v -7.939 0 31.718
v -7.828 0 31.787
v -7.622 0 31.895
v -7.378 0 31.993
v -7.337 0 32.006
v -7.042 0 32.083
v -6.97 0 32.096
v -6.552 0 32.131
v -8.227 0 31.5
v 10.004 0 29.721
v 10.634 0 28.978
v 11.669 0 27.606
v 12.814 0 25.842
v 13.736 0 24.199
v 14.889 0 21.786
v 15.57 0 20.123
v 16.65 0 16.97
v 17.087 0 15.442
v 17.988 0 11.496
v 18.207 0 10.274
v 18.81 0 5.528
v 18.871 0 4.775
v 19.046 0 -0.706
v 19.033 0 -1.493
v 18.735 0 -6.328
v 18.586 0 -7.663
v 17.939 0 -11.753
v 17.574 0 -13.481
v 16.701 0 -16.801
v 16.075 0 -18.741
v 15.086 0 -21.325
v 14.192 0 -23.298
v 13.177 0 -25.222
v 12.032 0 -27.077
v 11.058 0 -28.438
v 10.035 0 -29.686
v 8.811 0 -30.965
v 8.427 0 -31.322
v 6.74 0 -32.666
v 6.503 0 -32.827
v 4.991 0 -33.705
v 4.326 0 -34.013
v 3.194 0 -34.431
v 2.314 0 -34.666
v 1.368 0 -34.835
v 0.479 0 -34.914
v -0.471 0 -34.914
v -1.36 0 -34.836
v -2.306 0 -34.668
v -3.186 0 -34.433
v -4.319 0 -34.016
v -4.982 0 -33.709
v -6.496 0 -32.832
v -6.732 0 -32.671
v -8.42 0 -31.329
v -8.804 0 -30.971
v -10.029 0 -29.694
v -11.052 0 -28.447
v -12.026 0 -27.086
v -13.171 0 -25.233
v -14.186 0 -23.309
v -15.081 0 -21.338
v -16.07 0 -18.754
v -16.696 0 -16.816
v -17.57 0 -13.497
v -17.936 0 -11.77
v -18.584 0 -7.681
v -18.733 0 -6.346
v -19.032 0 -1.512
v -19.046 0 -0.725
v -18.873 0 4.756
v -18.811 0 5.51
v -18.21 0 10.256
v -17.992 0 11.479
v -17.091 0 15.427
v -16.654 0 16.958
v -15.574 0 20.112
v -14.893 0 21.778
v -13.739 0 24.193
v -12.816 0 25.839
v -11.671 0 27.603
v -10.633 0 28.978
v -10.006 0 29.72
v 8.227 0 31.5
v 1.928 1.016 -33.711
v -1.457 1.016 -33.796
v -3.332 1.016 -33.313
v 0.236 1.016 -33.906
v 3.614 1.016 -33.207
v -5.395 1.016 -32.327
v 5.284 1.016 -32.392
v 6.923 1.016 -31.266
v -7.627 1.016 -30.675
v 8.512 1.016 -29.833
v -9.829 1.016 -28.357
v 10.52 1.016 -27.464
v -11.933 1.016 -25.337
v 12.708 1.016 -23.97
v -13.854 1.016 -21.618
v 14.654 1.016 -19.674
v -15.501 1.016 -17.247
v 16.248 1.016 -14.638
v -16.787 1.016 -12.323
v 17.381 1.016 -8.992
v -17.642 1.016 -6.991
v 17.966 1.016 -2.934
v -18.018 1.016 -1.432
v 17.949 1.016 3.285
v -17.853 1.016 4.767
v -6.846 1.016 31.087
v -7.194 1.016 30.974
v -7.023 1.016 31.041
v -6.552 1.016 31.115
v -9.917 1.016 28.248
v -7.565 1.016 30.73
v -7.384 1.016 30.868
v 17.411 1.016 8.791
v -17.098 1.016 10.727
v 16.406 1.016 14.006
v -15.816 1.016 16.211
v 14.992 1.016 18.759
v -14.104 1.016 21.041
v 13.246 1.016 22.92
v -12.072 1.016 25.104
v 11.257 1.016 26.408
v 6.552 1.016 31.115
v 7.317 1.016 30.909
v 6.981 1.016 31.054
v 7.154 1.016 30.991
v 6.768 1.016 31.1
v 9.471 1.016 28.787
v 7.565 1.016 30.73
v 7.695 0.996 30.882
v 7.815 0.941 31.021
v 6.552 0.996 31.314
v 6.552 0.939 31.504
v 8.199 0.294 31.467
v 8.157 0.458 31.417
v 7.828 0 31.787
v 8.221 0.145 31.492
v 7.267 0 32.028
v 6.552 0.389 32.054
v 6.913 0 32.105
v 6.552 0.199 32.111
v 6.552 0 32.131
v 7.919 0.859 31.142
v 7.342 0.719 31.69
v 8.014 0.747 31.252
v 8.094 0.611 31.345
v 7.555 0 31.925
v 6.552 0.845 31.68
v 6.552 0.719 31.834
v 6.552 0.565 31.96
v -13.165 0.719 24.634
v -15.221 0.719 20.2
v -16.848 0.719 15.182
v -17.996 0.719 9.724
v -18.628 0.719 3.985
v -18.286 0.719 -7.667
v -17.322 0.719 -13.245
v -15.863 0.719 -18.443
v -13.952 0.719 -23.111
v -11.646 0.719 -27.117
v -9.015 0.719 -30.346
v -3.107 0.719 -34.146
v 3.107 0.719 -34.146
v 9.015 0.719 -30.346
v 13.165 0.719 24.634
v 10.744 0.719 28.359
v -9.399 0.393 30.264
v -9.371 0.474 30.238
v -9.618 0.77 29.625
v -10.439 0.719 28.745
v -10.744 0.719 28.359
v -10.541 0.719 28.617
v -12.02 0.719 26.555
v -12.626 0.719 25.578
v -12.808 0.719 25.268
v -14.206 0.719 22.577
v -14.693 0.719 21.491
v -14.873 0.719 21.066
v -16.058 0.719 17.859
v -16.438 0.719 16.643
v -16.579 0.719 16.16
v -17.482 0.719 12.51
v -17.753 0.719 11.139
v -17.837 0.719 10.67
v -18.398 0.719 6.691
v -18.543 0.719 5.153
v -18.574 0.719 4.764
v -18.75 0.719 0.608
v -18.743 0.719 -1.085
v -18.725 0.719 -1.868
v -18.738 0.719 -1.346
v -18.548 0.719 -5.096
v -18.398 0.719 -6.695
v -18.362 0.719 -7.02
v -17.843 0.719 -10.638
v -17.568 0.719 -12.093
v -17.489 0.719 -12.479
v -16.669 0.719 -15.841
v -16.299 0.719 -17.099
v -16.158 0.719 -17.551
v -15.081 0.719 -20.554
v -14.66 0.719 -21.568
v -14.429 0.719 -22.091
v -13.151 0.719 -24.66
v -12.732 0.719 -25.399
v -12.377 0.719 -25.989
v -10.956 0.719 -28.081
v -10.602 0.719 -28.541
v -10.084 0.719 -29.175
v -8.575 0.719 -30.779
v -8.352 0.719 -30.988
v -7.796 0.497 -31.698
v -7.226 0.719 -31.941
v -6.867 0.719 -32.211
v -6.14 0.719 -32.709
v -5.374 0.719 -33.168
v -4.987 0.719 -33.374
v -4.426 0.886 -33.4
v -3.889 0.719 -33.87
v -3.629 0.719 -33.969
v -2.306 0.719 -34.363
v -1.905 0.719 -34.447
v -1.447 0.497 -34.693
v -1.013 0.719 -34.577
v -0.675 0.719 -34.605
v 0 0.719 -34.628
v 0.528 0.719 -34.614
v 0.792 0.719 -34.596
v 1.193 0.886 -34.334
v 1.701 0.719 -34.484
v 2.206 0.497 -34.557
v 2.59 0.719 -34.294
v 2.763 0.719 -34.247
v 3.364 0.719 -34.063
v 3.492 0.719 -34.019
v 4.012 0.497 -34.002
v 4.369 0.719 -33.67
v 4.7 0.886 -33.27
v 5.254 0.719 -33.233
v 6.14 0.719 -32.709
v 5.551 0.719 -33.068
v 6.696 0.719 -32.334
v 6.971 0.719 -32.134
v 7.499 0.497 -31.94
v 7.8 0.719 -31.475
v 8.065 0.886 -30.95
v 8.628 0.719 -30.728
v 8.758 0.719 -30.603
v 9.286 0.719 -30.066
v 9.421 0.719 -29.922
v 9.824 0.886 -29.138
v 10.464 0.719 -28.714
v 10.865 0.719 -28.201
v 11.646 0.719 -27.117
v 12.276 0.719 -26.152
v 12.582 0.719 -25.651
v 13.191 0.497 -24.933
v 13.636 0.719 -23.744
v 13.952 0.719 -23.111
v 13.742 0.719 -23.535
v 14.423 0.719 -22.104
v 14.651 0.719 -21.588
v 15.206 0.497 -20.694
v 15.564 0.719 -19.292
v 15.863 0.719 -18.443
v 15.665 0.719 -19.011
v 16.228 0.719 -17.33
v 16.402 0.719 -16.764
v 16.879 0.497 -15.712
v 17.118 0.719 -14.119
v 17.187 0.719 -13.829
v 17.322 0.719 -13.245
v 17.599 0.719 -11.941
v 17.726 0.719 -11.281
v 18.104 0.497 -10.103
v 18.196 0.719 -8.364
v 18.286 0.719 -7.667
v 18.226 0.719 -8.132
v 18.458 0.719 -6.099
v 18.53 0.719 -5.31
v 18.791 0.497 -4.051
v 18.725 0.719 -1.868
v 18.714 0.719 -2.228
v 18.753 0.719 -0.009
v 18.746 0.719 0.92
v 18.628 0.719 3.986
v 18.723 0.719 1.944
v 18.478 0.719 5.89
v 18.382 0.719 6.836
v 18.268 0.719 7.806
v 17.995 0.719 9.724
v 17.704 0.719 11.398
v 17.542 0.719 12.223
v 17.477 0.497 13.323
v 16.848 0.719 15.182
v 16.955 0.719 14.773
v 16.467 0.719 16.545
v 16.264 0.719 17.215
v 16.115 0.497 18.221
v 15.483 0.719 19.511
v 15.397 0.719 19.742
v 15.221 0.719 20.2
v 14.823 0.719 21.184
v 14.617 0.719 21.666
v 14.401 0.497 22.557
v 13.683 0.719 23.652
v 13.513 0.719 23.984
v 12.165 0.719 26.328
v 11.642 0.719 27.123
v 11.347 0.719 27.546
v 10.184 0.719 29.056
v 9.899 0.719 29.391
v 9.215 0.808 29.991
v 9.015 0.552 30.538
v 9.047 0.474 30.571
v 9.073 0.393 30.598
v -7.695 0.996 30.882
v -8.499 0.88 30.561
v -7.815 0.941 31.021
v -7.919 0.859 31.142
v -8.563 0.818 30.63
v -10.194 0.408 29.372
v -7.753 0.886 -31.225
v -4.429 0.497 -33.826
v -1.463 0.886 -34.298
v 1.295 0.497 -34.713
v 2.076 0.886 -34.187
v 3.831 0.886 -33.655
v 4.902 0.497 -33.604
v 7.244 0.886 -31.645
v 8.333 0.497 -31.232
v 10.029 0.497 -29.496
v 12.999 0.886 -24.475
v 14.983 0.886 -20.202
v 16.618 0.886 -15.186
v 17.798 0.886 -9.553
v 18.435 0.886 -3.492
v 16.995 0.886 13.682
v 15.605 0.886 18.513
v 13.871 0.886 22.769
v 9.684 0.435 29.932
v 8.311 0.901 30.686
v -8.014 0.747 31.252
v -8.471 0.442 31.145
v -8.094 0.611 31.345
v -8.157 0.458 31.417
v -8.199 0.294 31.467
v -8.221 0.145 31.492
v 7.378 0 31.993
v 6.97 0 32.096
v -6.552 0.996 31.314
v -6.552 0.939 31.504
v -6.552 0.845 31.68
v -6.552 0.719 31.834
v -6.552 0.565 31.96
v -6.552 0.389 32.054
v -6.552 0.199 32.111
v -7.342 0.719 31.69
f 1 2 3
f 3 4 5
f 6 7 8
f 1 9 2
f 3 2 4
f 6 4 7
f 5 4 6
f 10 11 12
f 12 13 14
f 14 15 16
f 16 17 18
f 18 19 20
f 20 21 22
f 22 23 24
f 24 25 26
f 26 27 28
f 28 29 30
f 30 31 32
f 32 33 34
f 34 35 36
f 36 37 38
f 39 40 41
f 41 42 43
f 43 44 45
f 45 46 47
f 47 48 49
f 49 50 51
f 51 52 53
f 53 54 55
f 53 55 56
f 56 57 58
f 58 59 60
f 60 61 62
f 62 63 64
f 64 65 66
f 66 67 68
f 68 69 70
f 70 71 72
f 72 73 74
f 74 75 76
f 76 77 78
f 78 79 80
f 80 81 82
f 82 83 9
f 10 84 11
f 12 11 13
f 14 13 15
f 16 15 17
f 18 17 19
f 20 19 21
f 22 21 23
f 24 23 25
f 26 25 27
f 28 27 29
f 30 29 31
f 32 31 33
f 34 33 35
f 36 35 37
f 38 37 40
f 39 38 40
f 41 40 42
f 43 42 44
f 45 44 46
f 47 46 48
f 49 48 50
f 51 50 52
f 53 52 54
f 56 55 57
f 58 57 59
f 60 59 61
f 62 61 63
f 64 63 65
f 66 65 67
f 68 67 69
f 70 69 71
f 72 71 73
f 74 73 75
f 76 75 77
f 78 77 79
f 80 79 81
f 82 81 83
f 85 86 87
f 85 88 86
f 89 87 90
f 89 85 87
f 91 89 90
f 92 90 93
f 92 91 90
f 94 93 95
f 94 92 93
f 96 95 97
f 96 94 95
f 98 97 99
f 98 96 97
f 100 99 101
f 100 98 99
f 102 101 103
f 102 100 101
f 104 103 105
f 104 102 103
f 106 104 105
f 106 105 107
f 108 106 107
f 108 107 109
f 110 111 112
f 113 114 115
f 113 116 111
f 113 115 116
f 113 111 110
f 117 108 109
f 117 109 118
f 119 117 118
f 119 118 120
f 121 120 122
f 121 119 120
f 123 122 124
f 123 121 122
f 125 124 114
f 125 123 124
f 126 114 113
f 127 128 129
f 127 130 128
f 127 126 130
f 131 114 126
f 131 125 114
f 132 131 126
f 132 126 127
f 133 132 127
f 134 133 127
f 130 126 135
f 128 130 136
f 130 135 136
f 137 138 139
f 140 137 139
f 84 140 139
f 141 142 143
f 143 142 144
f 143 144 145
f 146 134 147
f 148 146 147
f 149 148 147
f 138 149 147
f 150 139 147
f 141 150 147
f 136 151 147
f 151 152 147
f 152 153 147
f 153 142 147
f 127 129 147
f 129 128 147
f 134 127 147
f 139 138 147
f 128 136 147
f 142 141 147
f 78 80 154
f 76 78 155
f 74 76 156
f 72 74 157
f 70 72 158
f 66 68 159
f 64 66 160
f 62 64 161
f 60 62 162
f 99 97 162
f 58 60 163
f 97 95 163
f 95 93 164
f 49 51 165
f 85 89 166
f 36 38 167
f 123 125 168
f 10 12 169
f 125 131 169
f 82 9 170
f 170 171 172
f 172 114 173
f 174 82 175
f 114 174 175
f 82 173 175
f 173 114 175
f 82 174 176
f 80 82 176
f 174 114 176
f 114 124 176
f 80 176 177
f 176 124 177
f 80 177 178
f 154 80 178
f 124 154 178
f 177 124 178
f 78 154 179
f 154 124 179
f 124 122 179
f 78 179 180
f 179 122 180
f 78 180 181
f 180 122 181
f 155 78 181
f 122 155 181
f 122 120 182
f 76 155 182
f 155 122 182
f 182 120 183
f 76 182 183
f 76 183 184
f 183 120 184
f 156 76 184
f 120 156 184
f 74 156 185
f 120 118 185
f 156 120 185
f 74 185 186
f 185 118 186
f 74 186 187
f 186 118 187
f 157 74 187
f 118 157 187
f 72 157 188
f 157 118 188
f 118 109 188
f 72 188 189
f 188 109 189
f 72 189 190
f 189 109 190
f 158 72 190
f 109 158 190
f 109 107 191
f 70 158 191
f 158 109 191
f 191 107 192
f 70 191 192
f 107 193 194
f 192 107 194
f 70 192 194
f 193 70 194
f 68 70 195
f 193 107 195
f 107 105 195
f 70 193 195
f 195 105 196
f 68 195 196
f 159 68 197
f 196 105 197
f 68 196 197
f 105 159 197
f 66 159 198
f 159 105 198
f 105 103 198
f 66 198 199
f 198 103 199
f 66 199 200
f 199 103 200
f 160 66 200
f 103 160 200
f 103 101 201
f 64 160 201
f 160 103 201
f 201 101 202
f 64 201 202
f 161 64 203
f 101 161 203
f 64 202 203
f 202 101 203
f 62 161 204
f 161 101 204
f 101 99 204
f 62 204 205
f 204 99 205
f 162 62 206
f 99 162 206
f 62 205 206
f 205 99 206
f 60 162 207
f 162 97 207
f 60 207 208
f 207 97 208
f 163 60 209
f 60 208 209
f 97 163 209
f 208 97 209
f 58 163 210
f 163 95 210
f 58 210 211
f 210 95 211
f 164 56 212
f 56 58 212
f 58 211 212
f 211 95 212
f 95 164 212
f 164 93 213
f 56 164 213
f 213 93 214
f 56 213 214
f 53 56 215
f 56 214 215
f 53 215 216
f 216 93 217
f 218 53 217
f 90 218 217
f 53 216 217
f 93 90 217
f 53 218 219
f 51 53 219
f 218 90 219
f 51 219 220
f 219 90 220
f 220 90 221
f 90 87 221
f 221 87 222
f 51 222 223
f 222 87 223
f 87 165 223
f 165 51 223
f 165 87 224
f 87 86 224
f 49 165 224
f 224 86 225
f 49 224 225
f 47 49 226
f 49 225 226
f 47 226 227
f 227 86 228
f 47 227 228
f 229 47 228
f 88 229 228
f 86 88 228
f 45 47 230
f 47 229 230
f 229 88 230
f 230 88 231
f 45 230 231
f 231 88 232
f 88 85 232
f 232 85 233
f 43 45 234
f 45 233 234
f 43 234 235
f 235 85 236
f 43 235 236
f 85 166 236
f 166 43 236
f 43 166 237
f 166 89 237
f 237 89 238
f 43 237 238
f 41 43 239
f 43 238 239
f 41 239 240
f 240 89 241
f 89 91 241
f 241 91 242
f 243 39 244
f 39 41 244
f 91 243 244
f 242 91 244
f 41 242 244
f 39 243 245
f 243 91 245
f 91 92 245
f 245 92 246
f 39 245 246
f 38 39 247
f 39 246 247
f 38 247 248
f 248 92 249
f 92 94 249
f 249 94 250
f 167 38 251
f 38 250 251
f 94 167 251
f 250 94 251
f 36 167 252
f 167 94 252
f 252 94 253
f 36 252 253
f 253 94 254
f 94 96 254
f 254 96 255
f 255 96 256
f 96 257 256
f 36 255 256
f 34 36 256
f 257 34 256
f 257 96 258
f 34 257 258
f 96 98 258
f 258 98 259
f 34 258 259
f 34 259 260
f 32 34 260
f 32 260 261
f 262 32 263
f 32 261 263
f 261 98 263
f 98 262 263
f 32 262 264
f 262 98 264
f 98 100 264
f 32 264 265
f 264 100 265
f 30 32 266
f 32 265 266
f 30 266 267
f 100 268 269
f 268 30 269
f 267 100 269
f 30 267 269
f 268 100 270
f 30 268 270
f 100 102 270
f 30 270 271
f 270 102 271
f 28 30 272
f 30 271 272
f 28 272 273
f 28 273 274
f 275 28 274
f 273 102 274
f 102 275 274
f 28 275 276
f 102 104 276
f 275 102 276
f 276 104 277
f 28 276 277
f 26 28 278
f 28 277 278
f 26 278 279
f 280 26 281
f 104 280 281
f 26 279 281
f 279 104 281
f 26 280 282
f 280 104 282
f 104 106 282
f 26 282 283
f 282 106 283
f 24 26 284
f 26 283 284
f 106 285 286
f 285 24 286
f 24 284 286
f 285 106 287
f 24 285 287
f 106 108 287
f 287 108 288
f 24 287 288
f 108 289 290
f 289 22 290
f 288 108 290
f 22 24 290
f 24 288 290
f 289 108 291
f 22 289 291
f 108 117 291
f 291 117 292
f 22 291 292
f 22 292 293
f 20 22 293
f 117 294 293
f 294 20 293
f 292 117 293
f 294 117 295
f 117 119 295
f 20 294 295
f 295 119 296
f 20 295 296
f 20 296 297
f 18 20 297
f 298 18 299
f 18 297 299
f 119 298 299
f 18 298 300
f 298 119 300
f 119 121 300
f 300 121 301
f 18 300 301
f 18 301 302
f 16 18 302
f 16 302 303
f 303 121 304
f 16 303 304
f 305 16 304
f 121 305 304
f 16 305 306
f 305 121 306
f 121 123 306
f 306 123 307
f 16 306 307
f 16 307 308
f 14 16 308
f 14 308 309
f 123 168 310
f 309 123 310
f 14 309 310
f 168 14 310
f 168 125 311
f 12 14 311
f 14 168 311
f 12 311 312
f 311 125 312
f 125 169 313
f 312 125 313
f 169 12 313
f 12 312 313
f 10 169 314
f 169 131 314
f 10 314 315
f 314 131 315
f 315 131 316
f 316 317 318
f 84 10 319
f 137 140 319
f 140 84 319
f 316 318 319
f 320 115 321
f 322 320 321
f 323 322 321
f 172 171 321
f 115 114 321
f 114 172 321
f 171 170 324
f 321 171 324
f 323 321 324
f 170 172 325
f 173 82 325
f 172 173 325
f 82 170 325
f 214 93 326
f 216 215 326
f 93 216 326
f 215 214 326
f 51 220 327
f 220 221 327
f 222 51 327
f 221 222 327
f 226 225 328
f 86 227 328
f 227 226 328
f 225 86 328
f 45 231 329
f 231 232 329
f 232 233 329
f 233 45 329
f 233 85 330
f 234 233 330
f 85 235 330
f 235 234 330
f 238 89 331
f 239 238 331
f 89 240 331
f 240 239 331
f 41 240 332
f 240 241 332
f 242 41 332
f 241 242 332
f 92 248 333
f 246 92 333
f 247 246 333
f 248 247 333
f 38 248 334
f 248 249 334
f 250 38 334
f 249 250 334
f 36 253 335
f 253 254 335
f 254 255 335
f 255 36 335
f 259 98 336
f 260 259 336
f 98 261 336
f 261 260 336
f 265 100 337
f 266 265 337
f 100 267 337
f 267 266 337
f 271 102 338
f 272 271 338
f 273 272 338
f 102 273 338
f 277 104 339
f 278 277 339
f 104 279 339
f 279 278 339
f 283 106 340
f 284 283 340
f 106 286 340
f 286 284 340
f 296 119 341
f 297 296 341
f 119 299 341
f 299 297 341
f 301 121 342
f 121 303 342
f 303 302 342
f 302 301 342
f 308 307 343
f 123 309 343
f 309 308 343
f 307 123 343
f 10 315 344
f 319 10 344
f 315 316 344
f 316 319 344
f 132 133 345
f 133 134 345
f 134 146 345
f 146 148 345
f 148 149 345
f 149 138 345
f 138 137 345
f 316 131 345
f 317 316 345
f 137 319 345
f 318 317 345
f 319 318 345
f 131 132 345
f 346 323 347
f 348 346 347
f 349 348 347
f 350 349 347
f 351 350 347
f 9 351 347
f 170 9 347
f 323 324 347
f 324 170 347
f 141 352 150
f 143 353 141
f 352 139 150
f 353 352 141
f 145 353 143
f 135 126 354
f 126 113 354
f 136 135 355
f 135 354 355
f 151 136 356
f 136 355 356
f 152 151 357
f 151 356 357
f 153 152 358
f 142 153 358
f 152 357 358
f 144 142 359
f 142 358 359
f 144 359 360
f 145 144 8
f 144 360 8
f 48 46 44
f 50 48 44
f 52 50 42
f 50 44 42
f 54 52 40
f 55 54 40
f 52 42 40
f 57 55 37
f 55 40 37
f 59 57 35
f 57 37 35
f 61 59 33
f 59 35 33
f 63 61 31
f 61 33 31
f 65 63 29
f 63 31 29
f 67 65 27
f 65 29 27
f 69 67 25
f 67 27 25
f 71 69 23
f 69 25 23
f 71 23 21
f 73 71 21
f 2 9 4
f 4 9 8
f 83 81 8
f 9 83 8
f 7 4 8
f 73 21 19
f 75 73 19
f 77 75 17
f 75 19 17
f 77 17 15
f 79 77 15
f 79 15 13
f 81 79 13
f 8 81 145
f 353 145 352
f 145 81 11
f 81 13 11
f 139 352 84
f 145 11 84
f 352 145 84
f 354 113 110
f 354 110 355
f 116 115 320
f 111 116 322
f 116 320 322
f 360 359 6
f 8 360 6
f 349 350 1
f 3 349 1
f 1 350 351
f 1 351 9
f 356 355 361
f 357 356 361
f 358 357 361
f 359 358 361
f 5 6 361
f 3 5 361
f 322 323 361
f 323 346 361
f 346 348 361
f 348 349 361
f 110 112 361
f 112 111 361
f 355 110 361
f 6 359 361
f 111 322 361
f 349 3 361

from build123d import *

# Parameters (mm, degrees)
SKETCH1_RX          = 34.925
SKETCH1_RY          = 19.05
BOSS_EXTRUDE1_DEPTH = 1.016
CUT_EXTRUDE1_DEPTH  = 40.795607559
FILLET1_R           = 2.54
FILLET2_R           = 1.016


with BuildPart() as part:
    # Sketch1 → Boss-Extrude1 (new body)
    with BuildSketch(Plane(origin=(0, 0, 0), x_dir=(1, 0, 0), z_dir=(0, 1, 0))):
        with Locations(Location((0, 0), (0, 0, -90))):
            Ellipse(SKETCH1_RX, SKETCH1_RY)
    extrude(amount=BOSS_EXTRUDE1_DEPTH)

    # Sketch2 → Cut-Extrude1 (cut, through all)
    with BuildSketch(Plane(origin=(0, 1.016, 0), x_dir=(1, 0, 0), z_dir=(0, 1, 0))):
        with BuildLine():
            Line((-7.466044736, -32.131), (7.466044736, -32.131))
            add(Edge.make_bspline(
                [(-7.466044736, -32.131), (0, -37.961956522), (7.466044736, -32.131)],
                knots=[5.880469466, 5.880469466, 5.880469466, 6.685901149, 6.685901149, 6.685901149], degree=2, weights=[1, 0.92, 1]))
        make_face()
    extrude(amount=-CUT_EXTRUDE1_DEPTH, mode=Mode.SUBTRACT)

    # Fillet1
    fillet1_edges = [part.edges().sort_by_distance(p)[0] for p in [
        (-7.466044736, 0.508, 32.131),
        (7.466044736, 0.508, 32.131),
    ]]
    fillet(fillet1_edges, radius=FILLET1_R)

    # Fillet2
    fillet2_edges = [part.edges().sort_by_distance(p)[0] for p in [
        (7.44707344, 1.016, 31.967969469),
        (-7.44707344, 1.016, 31.967969469),
        (0, 1.016, 32.131),
        (0, 1.016, -34.925),
    ]]
    fillet(fillet2_edges, radius=FILLET2_R - 0.0004)  # a hair under: the kernel refuses the full size


solid = part.part
